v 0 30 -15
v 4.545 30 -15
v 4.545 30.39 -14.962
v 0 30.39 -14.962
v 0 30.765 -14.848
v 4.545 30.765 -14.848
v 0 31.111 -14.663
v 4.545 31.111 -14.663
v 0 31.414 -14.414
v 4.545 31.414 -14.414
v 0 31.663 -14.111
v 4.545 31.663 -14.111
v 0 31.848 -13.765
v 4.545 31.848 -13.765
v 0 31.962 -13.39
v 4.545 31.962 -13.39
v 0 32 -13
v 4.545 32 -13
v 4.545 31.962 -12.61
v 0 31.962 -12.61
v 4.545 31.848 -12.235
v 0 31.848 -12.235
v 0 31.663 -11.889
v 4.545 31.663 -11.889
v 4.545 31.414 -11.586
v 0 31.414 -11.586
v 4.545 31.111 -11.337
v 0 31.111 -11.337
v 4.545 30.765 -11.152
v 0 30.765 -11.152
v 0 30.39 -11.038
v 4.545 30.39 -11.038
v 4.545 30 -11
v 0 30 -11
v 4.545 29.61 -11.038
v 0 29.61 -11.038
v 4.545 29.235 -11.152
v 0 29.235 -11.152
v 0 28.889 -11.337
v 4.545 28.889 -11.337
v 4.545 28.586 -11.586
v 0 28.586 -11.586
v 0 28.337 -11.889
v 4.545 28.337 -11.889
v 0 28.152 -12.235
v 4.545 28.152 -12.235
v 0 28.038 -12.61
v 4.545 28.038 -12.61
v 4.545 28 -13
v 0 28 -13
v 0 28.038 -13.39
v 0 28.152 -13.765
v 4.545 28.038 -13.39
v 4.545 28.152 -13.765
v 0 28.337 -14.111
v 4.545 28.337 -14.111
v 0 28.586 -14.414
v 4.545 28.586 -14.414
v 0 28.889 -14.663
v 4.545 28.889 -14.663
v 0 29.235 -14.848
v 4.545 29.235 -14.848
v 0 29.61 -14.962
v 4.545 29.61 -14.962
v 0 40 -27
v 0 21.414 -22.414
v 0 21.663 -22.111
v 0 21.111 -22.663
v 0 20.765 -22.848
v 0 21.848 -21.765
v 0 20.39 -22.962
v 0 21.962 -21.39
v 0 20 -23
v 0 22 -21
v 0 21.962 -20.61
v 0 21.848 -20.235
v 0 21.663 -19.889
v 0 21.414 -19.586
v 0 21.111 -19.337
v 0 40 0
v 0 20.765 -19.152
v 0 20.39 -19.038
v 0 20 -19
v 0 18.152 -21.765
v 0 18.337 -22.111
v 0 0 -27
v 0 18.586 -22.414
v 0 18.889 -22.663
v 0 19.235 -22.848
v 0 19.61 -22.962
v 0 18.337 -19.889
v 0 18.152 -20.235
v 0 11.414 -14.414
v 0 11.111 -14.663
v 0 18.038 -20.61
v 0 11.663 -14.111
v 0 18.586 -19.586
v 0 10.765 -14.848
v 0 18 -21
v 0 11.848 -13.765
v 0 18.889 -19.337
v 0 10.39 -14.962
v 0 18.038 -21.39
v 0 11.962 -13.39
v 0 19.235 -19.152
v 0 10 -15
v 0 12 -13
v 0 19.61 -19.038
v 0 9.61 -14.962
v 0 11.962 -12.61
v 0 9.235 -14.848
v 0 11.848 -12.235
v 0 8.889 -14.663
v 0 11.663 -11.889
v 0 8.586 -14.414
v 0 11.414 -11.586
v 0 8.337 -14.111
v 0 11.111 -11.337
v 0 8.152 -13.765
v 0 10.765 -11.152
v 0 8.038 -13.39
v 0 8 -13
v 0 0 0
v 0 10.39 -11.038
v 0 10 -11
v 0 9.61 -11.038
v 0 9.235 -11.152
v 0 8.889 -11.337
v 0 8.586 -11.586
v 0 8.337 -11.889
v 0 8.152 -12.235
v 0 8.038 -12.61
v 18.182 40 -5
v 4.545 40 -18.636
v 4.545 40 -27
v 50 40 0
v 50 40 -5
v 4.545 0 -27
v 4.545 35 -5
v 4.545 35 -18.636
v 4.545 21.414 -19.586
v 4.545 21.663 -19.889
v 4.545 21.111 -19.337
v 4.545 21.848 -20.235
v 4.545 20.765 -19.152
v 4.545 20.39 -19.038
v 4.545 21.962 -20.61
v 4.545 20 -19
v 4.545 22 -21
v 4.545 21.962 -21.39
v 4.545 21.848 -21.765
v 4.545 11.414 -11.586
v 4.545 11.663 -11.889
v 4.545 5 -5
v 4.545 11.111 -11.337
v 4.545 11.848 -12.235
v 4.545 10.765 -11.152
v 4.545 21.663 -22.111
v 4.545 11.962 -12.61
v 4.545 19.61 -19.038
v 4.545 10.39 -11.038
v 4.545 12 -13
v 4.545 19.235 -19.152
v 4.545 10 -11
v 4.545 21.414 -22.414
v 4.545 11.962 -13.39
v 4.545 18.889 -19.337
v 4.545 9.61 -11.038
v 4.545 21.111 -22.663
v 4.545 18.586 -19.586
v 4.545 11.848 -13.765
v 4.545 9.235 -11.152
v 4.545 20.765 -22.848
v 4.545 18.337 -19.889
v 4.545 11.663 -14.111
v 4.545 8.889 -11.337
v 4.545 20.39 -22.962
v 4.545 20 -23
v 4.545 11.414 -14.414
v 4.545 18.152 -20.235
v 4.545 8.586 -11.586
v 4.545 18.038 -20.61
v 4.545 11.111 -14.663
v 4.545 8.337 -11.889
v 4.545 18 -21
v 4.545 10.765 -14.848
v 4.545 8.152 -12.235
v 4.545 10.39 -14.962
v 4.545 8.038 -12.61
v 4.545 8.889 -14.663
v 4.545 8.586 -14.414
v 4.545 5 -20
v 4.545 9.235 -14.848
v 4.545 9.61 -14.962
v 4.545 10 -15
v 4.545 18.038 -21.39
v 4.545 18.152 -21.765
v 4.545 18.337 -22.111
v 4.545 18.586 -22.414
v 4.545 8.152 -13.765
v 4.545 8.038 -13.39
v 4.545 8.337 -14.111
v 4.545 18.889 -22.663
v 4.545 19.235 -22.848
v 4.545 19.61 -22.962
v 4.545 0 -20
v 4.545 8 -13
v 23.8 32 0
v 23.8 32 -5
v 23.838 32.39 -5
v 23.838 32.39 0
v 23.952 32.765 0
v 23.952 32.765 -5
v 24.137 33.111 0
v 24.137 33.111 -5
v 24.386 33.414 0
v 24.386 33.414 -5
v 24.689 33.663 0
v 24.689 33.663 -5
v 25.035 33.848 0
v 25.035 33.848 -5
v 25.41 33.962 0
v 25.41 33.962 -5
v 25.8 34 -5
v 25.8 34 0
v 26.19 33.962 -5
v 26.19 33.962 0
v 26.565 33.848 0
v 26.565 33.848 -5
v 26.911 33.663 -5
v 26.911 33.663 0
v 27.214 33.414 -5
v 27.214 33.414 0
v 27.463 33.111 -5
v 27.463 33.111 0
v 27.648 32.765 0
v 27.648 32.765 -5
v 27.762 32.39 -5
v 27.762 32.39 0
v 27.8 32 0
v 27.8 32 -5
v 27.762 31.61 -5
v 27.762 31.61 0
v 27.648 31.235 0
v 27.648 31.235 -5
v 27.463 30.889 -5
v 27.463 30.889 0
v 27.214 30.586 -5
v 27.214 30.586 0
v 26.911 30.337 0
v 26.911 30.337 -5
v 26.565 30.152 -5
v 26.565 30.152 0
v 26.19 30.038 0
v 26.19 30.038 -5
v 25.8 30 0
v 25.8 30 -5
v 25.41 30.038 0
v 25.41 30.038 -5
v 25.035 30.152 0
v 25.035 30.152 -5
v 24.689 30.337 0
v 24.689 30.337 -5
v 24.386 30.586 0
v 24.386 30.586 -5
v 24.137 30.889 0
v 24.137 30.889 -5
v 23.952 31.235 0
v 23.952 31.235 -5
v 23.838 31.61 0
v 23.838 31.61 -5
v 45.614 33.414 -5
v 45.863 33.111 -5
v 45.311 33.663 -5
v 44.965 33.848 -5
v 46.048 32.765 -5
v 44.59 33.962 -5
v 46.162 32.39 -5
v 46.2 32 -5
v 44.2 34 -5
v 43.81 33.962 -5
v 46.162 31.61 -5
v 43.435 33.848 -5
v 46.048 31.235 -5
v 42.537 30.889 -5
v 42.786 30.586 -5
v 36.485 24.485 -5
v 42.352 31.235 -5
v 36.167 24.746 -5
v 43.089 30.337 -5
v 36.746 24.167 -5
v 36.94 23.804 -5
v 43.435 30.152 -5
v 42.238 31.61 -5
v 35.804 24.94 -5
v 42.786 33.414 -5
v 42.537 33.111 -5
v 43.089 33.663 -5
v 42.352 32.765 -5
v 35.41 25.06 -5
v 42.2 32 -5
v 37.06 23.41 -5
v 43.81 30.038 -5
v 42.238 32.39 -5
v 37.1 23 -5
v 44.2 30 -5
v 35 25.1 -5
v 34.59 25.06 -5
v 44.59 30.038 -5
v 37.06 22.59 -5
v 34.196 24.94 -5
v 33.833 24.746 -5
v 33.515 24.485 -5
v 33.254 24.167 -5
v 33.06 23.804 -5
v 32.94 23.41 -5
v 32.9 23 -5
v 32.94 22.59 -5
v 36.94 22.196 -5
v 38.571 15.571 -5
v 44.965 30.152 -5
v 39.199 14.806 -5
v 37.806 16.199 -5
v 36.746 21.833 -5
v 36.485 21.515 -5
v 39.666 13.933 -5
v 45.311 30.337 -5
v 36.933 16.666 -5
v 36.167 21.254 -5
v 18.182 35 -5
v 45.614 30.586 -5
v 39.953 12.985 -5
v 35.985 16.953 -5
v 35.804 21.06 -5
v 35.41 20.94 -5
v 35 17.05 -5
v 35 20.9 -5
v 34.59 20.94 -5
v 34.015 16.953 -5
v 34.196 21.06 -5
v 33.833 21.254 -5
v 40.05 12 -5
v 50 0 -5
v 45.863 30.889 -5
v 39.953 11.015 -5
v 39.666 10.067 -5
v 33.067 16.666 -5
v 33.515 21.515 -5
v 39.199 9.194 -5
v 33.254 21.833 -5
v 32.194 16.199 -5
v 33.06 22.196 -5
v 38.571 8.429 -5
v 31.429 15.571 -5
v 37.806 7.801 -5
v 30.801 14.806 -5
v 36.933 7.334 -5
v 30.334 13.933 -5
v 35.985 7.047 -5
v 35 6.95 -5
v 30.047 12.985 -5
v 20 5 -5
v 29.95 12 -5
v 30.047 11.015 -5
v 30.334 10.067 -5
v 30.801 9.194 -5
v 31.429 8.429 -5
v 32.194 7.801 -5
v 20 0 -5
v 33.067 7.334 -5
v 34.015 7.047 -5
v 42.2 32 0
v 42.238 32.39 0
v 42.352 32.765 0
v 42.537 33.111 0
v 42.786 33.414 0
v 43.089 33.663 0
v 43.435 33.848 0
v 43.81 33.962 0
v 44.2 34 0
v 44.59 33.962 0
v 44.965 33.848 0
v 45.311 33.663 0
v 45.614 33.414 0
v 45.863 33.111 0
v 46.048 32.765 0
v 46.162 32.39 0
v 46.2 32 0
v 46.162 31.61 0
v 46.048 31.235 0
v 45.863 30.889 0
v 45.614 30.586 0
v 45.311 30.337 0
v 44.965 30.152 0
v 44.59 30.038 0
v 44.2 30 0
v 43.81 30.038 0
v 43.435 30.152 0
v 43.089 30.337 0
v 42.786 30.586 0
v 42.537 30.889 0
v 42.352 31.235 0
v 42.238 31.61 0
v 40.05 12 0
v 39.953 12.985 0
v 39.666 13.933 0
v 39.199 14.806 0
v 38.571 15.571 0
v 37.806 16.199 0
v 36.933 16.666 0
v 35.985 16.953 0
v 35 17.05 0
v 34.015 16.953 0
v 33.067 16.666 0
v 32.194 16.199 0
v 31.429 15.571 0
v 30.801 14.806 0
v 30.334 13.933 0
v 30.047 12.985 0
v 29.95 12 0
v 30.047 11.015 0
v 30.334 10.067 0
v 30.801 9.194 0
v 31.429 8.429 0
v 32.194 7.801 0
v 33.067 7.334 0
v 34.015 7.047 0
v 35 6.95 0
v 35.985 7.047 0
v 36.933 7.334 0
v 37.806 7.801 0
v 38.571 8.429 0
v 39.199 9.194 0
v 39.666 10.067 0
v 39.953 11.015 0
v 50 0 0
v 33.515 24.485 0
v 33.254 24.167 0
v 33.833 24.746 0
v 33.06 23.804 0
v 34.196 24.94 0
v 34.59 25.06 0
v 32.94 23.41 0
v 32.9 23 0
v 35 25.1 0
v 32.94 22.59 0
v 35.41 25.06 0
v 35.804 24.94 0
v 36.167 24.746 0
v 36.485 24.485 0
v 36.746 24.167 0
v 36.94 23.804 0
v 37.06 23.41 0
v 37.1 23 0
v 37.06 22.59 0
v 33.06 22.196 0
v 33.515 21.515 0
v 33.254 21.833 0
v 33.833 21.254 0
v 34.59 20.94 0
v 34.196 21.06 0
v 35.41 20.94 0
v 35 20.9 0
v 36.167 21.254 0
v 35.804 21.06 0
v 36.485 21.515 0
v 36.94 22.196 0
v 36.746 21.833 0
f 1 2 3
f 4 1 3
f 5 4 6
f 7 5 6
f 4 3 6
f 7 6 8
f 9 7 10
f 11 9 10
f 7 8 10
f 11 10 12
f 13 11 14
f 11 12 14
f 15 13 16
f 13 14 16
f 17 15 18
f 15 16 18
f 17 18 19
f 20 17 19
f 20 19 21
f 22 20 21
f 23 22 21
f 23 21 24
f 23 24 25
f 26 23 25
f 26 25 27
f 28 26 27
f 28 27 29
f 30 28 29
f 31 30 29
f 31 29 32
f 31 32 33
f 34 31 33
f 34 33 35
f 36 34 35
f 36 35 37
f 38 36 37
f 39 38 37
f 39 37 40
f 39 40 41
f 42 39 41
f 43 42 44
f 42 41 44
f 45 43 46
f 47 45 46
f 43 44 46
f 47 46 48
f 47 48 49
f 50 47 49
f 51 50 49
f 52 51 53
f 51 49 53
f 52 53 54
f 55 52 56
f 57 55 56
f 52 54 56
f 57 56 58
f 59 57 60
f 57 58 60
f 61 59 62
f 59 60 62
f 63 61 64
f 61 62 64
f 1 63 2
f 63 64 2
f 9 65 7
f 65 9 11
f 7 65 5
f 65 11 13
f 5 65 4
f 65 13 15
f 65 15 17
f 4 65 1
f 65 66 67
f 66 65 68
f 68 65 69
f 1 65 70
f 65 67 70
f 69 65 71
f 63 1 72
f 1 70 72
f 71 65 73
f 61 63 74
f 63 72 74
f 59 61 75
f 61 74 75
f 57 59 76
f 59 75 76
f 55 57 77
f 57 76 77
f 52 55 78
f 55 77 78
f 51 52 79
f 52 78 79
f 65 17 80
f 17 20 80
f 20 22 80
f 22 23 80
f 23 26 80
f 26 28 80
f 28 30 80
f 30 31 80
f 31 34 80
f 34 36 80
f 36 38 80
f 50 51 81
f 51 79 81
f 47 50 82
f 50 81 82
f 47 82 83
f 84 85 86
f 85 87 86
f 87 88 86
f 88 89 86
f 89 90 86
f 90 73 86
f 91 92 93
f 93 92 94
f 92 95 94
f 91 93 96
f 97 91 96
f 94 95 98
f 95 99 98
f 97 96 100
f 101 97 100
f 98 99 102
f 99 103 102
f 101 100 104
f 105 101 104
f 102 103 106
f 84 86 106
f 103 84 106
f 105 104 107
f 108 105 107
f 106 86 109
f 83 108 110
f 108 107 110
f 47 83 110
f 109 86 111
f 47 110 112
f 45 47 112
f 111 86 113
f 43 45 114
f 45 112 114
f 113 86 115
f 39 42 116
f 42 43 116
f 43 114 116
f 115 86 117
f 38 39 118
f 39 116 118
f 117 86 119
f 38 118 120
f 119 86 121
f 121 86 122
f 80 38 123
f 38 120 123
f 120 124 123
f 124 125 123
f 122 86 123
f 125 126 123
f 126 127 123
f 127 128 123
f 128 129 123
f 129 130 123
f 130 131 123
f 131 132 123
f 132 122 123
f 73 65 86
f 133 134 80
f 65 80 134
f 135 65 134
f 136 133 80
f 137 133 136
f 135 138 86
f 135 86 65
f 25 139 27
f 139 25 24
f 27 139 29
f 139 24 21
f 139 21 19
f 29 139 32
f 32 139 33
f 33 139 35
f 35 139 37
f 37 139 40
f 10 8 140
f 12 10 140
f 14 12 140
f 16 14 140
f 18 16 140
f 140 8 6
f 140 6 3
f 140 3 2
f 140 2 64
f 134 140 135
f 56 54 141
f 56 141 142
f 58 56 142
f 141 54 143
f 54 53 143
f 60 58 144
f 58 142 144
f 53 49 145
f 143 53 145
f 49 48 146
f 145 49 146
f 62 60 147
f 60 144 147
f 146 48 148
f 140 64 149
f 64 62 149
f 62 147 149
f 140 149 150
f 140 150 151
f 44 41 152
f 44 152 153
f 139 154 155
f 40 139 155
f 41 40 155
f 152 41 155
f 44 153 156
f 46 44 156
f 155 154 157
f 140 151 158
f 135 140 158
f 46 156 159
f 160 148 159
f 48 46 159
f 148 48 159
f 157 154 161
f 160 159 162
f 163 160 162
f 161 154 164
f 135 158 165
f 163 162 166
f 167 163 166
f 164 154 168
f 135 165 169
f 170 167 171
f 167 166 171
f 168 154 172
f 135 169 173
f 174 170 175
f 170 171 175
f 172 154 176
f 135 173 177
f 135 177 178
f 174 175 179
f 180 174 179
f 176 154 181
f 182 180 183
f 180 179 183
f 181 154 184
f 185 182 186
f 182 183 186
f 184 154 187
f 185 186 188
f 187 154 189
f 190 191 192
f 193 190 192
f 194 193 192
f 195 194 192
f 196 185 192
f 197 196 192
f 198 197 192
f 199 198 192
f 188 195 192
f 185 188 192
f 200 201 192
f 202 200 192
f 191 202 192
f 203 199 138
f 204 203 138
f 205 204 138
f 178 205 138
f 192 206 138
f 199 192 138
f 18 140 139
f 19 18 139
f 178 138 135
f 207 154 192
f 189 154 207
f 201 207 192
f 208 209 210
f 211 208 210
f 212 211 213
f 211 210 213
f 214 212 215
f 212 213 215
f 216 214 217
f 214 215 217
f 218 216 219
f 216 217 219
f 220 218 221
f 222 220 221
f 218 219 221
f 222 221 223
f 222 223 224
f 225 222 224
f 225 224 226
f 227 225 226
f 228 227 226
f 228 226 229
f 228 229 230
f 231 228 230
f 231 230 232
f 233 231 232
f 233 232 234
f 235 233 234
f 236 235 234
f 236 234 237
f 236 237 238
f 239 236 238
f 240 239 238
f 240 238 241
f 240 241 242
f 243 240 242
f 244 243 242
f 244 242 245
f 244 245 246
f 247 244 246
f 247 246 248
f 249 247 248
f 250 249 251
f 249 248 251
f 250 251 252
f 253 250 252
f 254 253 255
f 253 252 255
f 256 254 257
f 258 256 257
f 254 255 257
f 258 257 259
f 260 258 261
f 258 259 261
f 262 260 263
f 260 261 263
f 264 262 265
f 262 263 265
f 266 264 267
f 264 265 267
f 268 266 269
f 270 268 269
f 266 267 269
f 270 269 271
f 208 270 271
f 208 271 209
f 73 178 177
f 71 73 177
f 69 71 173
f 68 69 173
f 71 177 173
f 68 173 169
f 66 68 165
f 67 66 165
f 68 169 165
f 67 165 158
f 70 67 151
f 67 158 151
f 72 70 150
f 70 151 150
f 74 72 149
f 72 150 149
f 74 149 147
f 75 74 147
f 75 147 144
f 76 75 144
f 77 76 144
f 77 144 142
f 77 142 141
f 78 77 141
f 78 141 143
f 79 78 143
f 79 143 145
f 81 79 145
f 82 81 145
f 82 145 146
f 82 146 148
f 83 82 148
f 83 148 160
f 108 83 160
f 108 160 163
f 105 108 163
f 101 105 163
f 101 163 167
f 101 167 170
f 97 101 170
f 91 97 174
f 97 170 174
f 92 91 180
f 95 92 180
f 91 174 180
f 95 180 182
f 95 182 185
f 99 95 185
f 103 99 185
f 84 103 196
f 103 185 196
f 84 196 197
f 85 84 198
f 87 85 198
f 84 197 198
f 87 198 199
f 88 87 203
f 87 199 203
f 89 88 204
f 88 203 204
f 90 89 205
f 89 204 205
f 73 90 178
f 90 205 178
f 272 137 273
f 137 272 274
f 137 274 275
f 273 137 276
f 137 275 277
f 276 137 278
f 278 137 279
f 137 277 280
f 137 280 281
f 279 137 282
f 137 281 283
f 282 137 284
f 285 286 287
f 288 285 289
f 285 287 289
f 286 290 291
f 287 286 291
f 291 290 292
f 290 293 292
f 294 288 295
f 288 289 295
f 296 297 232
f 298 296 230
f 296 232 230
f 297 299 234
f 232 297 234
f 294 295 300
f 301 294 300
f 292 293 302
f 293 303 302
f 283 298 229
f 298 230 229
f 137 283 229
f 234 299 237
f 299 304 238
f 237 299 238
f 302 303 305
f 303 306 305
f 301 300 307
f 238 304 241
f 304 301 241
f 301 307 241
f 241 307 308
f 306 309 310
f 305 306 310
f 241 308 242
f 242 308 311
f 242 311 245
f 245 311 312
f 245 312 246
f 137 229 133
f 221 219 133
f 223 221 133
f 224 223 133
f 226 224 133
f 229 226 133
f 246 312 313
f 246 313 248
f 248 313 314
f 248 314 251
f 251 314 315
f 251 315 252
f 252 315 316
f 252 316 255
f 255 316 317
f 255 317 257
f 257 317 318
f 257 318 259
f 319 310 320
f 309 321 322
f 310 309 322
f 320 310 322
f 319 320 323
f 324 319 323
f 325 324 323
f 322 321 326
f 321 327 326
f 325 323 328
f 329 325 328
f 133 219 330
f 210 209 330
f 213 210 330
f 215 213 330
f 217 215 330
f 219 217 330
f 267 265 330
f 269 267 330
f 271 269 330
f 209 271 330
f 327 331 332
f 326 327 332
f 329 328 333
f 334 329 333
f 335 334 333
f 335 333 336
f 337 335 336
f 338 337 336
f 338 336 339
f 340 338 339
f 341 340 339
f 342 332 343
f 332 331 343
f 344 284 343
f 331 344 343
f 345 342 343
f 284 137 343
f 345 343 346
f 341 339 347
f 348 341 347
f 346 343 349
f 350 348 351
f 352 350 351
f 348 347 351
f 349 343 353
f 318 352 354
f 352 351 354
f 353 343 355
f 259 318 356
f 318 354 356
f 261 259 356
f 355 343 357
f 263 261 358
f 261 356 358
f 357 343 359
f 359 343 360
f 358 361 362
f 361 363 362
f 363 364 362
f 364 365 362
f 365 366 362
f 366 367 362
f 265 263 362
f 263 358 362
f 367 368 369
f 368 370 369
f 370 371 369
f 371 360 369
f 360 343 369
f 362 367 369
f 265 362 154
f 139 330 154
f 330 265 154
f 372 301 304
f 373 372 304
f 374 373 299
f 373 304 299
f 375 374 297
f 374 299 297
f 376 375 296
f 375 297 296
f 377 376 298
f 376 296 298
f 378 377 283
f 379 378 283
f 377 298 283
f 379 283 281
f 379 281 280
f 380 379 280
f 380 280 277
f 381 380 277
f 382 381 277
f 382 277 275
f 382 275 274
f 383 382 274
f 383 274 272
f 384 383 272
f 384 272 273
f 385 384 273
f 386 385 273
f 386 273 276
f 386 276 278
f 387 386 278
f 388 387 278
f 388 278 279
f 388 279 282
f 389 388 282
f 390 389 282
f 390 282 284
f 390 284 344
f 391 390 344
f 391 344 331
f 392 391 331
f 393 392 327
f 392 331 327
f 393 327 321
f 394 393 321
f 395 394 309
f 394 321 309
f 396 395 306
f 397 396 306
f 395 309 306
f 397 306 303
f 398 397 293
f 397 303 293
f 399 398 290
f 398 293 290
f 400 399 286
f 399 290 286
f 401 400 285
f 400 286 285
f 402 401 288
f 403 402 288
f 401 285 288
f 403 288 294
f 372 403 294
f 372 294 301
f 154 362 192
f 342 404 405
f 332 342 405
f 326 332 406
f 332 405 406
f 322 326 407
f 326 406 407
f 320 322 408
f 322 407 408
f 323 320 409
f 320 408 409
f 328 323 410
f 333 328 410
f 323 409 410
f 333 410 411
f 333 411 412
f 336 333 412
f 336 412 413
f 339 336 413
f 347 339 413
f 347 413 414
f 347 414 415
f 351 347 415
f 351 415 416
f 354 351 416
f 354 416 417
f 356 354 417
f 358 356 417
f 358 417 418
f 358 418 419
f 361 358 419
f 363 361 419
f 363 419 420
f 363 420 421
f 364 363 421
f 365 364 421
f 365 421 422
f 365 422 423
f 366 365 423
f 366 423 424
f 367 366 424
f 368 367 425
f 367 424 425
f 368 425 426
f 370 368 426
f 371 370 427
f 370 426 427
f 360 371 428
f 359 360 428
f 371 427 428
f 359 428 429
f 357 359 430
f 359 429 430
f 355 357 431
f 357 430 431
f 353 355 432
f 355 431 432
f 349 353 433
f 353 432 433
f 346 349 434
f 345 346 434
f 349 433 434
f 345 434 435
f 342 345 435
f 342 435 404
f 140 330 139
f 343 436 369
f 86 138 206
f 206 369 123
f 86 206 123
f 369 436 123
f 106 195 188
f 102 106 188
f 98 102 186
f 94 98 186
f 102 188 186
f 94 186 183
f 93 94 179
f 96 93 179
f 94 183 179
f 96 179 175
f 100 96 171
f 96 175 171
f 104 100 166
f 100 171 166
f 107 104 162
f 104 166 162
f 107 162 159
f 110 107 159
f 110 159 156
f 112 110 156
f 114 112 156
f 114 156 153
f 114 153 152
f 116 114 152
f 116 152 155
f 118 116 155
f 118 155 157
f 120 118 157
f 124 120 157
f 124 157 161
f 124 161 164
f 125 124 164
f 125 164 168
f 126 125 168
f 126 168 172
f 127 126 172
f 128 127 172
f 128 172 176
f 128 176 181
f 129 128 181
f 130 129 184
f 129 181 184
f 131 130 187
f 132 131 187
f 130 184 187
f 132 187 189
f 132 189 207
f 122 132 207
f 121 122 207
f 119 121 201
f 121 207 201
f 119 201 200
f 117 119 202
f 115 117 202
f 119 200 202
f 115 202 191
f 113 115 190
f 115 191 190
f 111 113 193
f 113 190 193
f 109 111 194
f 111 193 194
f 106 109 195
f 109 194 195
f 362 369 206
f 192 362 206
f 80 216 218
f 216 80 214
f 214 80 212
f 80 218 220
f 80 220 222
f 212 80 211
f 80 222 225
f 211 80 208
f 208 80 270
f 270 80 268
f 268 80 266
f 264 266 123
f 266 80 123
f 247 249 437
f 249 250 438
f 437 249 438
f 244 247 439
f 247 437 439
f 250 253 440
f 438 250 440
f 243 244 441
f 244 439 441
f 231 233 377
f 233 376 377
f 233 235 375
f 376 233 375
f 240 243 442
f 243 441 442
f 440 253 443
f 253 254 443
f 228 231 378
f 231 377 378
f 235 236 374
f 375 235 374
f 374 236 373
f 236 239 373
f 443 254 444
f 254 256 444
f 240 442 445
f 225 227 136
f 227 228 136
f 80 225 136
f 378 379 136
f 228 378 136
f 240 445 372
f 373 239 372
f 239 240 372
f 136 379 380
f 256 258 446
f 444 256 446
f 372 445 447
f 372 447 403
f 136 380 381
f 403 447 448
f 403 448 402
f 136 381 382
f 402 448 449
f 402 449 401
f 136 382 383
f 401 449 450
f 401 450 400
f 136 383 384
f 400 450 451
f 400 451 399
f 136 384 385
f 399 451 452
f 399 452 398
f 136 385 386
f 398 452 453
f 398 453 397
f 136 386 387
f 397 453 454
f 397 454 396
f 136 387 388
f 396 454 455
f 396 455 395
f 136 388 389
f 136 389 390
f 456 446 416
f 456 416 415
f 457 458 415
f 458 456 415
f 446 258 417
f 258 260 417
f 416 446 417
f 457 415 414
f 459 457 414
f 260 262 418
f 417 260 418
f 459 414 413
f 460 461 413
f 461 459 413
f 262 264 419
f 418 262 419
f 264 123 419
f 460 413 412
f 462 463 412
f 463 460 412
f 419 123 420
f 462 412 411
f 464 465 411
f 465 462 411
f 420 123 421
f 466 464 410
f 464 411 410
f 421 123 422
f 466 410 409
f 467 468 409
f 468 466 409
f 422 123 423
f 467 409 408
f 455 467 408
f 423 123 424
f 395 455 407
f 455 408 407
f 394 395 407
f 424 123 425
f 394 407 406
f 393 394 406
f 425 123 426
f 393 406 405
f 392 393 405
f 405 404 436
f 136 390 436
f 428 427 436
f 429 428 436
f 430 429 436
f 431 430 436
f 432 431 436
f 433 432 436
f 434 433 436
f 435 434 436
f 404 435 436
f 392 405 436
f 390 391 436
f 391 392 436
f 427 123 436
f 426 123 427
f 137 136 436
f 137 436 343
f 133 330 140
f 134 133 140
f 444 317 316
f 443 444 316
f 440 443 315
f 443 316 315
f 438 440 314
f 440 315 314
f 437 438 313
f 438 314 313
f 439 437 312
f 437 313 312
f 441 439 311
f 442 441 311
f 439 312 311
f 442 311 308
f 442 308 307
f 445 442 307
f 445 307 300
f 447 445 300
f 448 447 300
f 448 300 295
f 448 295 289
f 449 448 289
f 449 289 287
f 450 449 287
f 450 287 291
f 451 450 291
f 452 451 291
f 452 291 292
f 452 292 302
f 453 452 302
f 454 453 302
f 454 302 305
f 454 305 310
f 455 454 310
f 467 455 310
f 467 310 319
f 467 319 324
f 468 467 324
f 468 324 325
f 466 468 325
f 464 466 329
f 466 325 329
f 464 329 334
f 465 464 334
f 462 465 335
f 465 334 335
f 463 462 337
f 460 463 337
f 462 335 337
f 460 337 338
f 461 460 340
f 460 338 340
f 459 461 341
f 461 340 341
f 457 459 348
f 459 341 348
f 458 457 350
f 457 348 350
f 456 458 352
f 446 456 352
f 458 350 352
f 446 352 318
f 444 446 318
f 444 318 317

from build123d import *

# Parameters (mm, degrees)
BOSS_EXTRUDE1_DEPTH = 40
CUT_EXTRUDE1_DEPTH  = 35
BOSS_EXTRUDE2_DEPTH = 5
SKETCH6_R           = 2
CUT_EXTRUDE2_DEPTH  = 70.936511941
SKETCH7_R           = 3.1
SKETCH7_R_2         = 2.1
SKETCH7_R_3         = 2
CUT_EXTRUDE4_DEPTH  = 71.710678119
SKETCH8_R           = 5.05
CUT_EXTRUDE5_DEPTH  = 73.972597597
SKETCH10_W          = 8
SKETCH10_H          = 40
CUT_EXTRUDE8_DEPTH  = 70.936511941


with BuildPart() as part:
    # Sketch1 → Boss-Extrude1 (new body)
    with BuildSketch(Plane(origin=(0, 0, 0), x_dir=(1, 0, 0), z_dir=(0, 1, 0))):
        Polygon((0, 0), (50, 0), (50, 5), (18.181818182, 5), (4.545454545, 18.636363636), (4.545454545, 35), (0, 35), align=None)
    extrude(amount=BOSS_EXTRUDE1_DEPTH)

    # Sketch3 → Cut-Extrude1 (cut)
    with BuildSketch(Plane.XZ):
        Polygon((4.545454545, -18.636363636), (4.545454545, -5), (18.181818182, -5), align=None)
    extrude(amount=-CUT_EXTRUDE1_DEPTH, mode=Mode.SUBTRACT)

    # Sketch5 → Boss-Extrude2 (add)
    with BuildSketch(Plane.XZ):
        Polygon((4.545454545, -20), (4.545454545, -5), (20, -5), align=None)
    extrude(amount=-BOSS_EXTRUDE2_DEPTH)

    # Sketch6 → Cut-Extrude2 (cut, through all)
    with BuildSketch(Plane(origin=(4.545454545, 0, 0), x_dir=(0, 0, -1), z_dir=(1, 0, 0))):
        with Locations((13, 30)):
            Circle(SKETCH6_R)
        with Locations((13, 10)):
            Circle(SKETCH6_R)
        with Locations((21, 20)):
            Circle(SKETCH6_R)
    extrude(amount=-CUT_EXTRUDE2_DEPTH, mode=Mode.SUBTRACT)

    # Sketch7 → Cut-Extrude4 (cut, through all)
    with BuildSketch(Plane(origin=(0, 0, -5), x_dir=(-1, 0, 0), z_dir=(0, 0, -1))):
        with Locations((-35, 12)):
            Circle(SKETCH7_R)
        with Locations((-35, 23)):
            Circle(SKETCH7_R_2)
        with Locations((-25.8, 32)):
            Circle(SKETCH7_R_3)
        with Locations((-44.2, 32)):
            Circle(SKETCH7_R_3)
    extrude(amount=-CUT_EXTRUDE4_DEPTH, mode=Mode.SUBTRACT)

    # Sketch8 → Cut-Extrude5 (cut, through all)
    with BuildSketch(Plane.XY):
        with Locations((35, 12)):
            Circle(SKETCH8_R)
    extrude(amount=-CUT_EXTRUDE5_DEPTH, mode=Mode.SUBTRACT)

    # Sketch10 → Cut-Extrude8 (cut, through all)
    with BuildSketch(Plane(origin=(4.545454545, 0, 0), x_dir=(0, 0, -1), z_dir=(1, 0, 0))):
        with Locations((31, 20)):
            Rectangle(SKETCH10_W, SKETCH10_H)
    extrude(amount=-CUT_EXTRUDE8_DEPTH, mode=Mode.SUBTRACT)


solid = part.part
